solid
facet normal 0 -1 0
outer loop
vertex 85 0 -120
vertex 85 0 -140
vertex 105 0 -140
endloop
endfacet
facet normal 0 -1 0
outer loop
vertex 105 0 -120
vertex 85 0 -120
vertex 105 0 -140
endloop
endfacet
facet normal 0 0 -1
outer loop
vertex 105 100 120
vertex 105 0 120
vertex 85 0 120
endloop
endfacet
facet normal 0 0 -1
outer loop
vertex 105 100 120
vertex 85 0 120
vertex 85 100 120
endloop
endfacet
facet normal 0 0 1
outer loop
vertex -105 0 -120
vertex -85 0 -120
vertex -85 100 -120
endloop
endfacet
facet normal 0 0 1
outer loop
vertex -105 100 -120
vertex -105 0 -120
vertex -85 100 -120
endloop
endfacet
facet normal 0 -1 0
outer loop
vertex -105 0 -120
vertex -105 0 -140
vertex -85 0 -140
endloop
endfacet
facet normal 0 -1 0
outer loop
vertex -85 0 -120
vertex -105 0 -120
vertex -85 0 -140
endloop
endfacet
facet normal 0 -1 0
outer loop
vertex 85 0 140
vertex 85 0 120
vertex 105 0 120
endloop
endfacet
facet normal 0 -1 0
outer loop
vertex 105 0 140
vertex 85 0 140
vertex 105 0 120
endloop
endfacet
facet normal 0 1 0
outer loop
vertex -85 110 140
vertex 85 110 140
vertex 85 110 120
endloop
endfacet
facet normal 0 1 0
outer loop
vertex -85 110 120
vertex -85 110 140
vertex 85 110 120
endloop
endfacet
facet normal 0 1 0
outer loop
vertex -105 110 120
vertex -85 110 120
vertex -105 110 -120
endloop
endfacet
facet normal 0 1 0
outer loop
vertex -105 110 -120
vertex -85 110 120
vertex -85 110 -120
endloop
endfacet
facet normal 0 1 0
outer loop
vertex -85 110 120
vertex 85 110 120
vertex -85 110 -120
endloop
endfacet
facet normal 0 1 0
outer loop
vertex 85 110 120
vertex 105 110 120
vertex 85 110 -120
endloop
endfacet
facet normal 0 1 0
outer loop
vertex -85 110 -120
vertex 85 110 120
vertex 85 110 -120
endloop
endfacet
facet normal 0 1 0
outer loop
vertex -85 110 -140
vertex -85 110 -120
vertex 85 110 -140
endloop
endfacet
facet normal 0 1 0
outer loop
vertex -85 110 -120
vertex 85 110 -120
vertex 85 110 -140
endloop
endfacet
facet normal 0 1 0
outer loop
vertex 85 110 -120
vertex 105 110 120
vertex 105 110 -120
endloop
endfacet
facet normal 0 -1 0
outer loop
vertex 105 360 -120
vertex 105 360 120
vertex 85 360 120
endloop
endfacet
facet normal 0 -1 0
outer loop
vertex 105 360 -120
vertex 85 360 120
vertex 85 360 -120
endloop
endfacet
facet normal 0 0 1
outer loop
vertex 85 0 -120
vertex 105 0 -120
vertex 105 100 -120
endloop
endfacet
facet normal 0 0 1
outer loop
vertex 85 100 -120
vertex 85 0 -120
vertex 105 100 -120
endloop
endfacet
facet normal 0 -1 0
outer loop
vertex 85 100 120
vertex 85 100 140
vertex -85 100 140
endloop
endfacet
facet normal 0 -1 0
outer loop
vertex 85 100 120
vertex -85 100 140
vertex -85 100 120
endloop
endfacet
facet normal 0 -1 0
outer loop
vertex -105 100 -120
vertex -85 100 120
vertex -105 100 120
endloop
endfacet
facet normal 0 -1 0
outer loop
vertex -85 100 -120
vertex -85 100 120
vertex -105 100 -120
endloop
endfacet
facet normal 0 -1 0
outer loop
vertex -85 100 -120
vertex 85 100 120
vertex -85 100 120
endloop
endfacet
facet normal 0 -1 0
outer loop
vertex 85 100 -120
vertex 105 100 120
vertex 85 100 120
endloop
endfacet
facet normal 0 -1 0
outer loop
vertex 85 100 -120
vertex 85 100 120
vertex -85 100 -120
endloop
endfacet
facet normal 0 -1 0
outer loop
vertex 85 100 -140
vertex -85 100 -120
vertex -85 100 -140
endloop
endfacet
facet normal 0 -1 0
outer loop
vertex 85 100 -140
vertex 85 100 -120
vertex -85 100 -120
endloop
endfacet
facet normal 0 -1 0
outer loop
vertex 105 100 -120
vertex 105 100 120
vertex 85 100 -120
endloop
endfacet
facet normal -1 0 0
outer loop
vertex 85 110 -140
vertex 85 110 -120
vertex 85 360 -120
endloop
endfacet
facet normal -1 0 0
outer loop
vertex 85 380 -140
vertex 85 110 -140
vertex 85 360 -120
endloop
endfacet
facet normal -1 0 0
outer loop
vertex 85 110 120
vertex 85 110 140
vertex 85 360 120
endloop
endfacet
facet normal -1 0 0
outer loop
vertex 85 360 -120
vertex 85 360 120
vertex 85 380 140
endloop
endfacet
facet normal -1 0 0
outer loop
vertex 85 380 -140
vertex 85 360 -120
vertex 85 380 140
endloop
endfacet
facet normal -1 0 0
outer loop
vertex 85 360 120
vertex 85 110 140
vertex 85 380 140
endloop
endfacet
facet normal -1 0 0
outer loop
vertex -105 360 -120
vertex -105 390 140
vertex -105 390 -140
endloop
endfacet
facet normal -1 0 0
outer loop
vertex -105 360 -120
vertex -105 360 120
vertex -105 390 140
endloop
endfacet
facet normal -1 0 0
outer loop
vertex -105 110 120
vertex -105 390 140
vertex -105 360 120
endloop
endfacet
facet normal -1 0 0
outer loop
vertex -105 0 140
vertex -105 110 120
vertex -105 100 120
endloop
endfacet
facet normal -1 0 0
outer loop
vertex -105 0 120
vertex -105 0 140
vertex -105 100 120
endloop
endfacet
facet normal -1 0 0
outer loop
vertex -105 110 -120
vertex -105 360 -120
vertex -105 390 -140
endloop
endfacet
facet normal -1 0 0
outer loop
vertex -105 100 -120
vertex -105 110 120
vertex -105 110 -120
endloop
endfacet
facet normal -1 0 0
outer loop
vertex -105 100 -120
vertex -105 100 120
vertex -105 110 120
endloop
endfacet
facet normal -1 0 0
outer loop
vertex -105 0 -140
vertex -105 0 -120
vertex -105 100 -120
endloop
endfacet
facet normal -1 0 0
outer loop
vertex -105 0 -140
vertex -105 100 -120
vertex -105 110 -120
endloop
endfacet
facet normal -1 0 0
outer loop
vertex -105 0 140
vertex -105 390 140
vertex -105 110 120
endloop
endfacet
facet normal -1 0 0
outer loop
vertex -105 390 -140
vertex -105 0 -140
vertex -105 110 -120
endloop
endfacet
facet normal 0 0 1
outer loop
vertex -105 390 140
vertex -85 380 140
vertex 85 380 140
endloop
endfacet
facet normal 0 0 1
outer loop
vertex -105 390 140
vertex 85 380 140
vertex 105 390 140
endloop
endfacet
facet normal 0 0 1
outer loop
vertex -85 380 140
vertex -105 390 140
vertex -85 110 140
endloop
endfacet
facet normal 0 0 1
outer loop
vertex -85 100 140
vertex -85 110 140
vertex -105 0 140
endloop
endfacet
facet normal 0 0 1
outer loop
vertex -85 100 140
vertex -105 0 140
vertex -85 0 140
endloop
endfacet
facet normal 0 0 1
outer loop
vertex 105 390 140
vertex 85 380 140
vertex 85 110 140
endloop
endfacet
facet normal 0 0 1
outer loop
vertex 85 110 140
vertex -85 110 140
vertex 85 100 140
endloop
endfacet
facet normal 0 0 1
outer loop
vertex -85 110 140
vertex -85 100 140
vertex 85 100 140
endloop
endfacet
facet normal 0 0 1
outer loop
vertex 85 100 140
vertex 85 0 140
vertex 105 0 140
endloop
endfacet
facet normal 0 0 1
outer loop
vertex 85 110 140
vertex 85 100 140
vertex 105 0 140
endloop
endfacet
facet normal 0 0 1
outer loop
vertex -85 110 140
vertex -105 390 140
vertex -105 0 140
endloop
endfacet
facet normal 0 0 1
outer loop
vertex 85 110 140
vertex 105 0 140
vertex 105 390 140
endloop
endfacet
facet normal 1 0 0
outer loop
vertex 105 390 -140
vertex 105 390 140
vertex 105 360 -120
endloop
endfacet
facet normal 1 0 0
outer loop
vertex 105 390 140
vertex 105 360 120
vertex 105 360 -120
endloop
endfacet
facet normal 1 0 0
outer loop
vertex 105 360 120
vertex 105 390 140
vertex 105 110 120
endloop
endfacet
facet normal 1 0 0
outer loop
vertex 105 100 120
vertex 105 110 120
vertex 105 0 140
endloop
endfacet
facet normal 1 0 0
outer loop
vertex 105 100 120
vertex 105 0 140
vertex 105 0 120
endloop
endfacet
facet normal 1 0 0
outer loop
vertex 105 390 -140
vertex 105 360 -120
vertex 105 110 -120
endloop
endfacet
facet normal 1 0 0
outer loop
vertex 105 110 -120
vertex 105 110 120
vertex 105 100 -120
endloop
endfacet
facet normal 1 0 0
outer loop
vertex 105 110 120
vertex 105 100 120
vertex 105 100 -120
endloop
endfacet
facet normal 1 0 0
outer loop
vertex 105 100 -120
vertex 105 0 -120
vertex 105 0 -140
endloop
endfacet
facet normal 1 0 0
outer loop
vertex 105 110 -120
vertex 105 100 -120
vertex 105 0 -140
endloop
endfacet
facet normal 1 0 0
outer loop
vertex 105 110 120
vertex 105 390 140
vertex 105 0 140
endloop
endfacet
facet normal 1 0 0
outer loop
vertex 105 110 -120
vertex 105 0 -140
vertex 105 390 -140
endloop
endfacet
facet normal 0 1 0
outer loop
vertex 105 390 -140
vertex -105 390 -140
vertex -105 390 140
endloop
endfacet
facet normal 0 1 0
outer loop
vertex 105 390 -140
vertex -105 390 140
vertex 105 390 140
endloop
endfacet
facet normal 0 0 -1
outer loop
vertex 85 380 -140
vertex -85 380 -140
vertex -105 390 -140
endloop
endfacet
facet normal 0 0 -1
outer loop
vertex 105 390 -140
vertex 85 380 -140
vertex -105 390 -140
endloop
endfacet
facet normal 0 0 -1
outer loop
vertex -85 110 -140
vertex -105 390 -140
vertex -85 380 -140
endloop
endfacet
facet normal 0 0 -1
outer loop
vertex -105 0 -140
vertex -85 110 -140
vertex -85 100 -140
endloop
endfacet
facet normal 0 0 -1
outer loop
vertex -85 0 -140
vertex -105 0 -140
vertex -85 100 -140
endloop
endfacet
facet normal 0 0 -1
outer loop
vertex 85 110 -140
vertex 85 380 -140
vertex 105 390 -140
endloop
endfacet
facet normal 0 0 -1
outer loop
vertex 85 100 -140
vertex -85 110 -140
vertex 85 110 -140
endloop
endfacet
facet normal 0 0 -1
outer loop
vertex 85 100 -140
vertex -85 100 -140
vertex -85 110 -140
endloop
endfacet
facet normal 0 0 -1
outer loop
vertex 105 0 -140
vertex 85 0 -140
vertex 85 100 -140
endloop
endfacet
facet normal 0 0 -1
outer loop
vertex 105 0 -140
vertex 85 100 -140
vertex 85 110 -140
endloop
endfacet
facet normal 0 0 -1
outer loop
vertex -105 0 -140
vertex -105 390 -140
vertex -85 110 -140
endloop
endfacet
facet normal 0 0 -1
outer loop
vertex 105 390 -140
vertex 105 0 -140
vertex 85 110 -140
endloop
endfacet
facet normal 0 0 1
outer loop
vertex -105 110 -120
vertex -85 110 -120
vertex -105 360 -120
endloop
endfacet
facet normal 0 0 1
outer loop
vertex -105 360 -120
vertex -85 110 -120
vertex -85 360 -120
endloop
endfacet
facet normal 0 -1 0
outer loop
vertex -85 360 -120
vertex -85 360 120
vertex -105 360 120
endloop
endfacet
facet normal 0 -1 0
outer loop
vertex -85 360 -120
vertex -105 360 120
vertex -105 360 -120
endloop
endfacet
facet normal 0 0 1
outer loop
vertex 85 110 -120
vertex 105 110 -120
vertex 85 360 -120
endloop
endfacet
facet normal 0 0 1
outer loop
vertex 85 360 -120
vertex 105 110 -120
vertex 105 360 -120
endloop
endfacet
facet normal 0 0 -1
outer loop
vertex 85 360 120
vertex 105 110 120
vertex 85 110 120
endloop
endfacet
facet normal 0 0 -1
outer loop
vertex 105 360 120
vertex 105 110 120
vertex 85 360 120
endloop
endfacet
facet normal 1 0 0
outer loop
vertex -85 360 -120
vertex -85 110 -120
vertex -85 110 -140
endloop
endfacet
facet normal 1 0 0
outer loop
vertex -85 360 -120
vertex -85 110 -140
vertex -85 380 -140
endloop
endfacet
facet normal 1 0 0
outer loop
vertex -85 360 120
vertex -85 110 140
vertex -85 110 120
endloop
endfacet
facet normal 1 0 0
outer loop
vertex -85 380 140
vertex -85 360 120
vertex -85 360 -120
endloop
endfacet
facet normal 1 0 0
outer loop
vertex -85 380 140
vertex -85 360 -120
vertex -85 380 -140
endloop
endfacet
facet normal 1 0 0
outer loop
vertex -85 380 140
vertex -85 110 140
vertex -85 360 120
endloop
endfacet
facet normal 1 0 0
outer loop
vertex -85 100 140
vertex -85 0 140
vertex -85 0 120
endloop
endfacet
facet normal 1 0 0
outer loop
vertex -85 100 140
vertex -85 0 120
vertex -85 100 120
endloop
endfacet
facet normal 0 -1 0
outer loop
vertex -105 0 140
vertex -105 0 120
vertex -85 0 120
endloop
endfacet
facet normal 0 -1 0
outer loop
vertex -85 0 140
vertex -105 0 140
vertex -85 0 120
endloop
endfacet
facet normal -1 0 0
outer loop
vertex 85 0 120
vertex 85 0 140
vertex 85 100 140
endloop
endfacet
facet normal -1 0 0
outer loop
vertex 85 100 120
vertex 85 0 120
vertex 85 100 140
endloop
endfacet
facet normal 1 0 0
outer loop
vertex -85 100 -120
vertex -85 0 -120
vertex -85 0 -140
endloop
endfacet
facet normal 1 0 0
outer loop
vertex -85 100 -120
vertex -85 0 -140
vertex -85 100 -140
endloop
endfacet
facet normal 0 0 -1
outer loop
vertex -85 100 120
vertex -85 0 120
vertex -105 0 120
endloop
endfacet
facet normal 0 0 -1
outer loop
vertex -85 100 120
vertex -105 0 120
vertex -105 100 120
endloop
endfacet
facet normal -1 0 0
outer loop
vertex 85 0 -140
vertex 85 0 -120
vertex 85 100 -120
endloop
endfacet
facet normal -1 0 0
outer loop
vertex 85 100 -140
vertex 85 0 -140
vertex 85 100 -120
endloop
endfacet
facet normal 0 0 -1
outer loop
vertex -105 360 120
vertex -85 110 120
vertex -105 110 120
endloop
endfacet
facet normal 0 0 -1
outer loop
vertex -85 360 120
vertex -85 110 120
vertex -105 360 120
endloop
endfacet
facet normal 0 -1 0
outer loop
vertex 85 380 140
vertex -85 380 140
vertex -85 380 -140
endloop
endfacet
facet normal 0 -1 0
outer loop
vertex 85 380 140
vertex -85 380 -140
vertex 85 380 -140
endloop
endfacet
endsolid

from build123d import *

# Parameters (mm, degrees)
SKETCH1_W           = 210
SKETCH1_H           = 280
BOSS_EXTRUDE1_DEPTH = 390
SKETCH4_W           = 240
SKETCH4_H           = 100
SKETCH4_H_2         = 250
CUT_EXTRUDE1_DEPTH  = 300
SKETCH5_W           = 170
SKETCH5_H           = 100
SKETCH5_H_2         = 270
CUT_EXTRUDE2_DEPTH  = 300


with BuildPart() as part:
    # Sketch1 → Boss-Extrude1 (new body)
    with BuildSketch(Plane(origin=(0, 0, 0), x_dir=(1, 0, 0), z_dir=(0, 1, 0))):
        Rectangle(SKETCH1_W, SKETCH1_H)
    extrude(amount=BOSS_EXTRUDE1_DEPTH)

    # Sketch4 → Cut-Extrude1 (cut)
    with BuildSketch(Plane(origin=(105, 0, 0), x_dir=(0, 0, -1), z_dir=(1, 0, 0))):
        with Locations((0, 50)):
            Rectangle(SKETCH4_W, SKETCH4_H)
        with Locations((0, 235)):
            Rectangle(SKETCH4_W, SKETCH4_H_2)
    extrude(amount=-CUT_EXTRUDE1_DEPTH, mode=Mode.SUBTRACT)

    # Sketch5 → Cut-Extrude2 (cut)
    with BuildSketch(Plane.XY.offset(140)):
        with Locations((0, 50)):
            Rectangle(SKETCH5_W, SKETCH5_H)
        with Locations((0, 245)):
            Rectangle(SKETCH5_W, SKETCH5_H_2)
    extrude(amount=-CUT_EXTRUDE2_DEPTH, mode=Mode.SUBTRACT)


solid = part.part
